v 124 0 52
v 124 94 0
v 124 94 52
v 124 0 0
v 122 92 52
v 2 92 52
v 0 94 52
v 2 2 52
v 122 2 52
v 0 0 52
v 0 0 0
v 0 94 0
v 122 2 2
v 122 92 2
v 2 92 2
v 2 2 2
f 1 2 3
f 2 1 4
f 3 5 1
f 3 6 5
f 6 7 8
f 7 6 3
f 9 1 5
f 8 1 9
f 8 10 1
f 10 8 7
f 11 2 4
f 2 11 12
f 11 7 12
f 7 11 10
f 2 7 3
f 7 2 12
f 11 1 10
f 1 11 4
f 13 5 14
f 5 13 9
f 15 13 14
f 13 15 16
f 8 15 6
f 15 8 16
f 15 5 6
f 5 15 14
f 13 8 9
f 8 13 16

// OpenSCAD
//CUSTOMIZER VARIABLES

//	This section is displays the box options
//	Measurement of box on the X axis
Width = 120;	

//	Measurement of box on the Y axis
Depth = 90;	

//	Measurement of box on the Z axis
Height = 50;	

//	Thickness of box sides
Thick = 2;	//	[1:25]

difference() {
 	cube([Width+2*Thick,Depth+2*Thick,Height+Thick]);
	translate([Thick, Thick, Thick]) {
 		cube([Width,Depth,Height]);
 	}
 }
